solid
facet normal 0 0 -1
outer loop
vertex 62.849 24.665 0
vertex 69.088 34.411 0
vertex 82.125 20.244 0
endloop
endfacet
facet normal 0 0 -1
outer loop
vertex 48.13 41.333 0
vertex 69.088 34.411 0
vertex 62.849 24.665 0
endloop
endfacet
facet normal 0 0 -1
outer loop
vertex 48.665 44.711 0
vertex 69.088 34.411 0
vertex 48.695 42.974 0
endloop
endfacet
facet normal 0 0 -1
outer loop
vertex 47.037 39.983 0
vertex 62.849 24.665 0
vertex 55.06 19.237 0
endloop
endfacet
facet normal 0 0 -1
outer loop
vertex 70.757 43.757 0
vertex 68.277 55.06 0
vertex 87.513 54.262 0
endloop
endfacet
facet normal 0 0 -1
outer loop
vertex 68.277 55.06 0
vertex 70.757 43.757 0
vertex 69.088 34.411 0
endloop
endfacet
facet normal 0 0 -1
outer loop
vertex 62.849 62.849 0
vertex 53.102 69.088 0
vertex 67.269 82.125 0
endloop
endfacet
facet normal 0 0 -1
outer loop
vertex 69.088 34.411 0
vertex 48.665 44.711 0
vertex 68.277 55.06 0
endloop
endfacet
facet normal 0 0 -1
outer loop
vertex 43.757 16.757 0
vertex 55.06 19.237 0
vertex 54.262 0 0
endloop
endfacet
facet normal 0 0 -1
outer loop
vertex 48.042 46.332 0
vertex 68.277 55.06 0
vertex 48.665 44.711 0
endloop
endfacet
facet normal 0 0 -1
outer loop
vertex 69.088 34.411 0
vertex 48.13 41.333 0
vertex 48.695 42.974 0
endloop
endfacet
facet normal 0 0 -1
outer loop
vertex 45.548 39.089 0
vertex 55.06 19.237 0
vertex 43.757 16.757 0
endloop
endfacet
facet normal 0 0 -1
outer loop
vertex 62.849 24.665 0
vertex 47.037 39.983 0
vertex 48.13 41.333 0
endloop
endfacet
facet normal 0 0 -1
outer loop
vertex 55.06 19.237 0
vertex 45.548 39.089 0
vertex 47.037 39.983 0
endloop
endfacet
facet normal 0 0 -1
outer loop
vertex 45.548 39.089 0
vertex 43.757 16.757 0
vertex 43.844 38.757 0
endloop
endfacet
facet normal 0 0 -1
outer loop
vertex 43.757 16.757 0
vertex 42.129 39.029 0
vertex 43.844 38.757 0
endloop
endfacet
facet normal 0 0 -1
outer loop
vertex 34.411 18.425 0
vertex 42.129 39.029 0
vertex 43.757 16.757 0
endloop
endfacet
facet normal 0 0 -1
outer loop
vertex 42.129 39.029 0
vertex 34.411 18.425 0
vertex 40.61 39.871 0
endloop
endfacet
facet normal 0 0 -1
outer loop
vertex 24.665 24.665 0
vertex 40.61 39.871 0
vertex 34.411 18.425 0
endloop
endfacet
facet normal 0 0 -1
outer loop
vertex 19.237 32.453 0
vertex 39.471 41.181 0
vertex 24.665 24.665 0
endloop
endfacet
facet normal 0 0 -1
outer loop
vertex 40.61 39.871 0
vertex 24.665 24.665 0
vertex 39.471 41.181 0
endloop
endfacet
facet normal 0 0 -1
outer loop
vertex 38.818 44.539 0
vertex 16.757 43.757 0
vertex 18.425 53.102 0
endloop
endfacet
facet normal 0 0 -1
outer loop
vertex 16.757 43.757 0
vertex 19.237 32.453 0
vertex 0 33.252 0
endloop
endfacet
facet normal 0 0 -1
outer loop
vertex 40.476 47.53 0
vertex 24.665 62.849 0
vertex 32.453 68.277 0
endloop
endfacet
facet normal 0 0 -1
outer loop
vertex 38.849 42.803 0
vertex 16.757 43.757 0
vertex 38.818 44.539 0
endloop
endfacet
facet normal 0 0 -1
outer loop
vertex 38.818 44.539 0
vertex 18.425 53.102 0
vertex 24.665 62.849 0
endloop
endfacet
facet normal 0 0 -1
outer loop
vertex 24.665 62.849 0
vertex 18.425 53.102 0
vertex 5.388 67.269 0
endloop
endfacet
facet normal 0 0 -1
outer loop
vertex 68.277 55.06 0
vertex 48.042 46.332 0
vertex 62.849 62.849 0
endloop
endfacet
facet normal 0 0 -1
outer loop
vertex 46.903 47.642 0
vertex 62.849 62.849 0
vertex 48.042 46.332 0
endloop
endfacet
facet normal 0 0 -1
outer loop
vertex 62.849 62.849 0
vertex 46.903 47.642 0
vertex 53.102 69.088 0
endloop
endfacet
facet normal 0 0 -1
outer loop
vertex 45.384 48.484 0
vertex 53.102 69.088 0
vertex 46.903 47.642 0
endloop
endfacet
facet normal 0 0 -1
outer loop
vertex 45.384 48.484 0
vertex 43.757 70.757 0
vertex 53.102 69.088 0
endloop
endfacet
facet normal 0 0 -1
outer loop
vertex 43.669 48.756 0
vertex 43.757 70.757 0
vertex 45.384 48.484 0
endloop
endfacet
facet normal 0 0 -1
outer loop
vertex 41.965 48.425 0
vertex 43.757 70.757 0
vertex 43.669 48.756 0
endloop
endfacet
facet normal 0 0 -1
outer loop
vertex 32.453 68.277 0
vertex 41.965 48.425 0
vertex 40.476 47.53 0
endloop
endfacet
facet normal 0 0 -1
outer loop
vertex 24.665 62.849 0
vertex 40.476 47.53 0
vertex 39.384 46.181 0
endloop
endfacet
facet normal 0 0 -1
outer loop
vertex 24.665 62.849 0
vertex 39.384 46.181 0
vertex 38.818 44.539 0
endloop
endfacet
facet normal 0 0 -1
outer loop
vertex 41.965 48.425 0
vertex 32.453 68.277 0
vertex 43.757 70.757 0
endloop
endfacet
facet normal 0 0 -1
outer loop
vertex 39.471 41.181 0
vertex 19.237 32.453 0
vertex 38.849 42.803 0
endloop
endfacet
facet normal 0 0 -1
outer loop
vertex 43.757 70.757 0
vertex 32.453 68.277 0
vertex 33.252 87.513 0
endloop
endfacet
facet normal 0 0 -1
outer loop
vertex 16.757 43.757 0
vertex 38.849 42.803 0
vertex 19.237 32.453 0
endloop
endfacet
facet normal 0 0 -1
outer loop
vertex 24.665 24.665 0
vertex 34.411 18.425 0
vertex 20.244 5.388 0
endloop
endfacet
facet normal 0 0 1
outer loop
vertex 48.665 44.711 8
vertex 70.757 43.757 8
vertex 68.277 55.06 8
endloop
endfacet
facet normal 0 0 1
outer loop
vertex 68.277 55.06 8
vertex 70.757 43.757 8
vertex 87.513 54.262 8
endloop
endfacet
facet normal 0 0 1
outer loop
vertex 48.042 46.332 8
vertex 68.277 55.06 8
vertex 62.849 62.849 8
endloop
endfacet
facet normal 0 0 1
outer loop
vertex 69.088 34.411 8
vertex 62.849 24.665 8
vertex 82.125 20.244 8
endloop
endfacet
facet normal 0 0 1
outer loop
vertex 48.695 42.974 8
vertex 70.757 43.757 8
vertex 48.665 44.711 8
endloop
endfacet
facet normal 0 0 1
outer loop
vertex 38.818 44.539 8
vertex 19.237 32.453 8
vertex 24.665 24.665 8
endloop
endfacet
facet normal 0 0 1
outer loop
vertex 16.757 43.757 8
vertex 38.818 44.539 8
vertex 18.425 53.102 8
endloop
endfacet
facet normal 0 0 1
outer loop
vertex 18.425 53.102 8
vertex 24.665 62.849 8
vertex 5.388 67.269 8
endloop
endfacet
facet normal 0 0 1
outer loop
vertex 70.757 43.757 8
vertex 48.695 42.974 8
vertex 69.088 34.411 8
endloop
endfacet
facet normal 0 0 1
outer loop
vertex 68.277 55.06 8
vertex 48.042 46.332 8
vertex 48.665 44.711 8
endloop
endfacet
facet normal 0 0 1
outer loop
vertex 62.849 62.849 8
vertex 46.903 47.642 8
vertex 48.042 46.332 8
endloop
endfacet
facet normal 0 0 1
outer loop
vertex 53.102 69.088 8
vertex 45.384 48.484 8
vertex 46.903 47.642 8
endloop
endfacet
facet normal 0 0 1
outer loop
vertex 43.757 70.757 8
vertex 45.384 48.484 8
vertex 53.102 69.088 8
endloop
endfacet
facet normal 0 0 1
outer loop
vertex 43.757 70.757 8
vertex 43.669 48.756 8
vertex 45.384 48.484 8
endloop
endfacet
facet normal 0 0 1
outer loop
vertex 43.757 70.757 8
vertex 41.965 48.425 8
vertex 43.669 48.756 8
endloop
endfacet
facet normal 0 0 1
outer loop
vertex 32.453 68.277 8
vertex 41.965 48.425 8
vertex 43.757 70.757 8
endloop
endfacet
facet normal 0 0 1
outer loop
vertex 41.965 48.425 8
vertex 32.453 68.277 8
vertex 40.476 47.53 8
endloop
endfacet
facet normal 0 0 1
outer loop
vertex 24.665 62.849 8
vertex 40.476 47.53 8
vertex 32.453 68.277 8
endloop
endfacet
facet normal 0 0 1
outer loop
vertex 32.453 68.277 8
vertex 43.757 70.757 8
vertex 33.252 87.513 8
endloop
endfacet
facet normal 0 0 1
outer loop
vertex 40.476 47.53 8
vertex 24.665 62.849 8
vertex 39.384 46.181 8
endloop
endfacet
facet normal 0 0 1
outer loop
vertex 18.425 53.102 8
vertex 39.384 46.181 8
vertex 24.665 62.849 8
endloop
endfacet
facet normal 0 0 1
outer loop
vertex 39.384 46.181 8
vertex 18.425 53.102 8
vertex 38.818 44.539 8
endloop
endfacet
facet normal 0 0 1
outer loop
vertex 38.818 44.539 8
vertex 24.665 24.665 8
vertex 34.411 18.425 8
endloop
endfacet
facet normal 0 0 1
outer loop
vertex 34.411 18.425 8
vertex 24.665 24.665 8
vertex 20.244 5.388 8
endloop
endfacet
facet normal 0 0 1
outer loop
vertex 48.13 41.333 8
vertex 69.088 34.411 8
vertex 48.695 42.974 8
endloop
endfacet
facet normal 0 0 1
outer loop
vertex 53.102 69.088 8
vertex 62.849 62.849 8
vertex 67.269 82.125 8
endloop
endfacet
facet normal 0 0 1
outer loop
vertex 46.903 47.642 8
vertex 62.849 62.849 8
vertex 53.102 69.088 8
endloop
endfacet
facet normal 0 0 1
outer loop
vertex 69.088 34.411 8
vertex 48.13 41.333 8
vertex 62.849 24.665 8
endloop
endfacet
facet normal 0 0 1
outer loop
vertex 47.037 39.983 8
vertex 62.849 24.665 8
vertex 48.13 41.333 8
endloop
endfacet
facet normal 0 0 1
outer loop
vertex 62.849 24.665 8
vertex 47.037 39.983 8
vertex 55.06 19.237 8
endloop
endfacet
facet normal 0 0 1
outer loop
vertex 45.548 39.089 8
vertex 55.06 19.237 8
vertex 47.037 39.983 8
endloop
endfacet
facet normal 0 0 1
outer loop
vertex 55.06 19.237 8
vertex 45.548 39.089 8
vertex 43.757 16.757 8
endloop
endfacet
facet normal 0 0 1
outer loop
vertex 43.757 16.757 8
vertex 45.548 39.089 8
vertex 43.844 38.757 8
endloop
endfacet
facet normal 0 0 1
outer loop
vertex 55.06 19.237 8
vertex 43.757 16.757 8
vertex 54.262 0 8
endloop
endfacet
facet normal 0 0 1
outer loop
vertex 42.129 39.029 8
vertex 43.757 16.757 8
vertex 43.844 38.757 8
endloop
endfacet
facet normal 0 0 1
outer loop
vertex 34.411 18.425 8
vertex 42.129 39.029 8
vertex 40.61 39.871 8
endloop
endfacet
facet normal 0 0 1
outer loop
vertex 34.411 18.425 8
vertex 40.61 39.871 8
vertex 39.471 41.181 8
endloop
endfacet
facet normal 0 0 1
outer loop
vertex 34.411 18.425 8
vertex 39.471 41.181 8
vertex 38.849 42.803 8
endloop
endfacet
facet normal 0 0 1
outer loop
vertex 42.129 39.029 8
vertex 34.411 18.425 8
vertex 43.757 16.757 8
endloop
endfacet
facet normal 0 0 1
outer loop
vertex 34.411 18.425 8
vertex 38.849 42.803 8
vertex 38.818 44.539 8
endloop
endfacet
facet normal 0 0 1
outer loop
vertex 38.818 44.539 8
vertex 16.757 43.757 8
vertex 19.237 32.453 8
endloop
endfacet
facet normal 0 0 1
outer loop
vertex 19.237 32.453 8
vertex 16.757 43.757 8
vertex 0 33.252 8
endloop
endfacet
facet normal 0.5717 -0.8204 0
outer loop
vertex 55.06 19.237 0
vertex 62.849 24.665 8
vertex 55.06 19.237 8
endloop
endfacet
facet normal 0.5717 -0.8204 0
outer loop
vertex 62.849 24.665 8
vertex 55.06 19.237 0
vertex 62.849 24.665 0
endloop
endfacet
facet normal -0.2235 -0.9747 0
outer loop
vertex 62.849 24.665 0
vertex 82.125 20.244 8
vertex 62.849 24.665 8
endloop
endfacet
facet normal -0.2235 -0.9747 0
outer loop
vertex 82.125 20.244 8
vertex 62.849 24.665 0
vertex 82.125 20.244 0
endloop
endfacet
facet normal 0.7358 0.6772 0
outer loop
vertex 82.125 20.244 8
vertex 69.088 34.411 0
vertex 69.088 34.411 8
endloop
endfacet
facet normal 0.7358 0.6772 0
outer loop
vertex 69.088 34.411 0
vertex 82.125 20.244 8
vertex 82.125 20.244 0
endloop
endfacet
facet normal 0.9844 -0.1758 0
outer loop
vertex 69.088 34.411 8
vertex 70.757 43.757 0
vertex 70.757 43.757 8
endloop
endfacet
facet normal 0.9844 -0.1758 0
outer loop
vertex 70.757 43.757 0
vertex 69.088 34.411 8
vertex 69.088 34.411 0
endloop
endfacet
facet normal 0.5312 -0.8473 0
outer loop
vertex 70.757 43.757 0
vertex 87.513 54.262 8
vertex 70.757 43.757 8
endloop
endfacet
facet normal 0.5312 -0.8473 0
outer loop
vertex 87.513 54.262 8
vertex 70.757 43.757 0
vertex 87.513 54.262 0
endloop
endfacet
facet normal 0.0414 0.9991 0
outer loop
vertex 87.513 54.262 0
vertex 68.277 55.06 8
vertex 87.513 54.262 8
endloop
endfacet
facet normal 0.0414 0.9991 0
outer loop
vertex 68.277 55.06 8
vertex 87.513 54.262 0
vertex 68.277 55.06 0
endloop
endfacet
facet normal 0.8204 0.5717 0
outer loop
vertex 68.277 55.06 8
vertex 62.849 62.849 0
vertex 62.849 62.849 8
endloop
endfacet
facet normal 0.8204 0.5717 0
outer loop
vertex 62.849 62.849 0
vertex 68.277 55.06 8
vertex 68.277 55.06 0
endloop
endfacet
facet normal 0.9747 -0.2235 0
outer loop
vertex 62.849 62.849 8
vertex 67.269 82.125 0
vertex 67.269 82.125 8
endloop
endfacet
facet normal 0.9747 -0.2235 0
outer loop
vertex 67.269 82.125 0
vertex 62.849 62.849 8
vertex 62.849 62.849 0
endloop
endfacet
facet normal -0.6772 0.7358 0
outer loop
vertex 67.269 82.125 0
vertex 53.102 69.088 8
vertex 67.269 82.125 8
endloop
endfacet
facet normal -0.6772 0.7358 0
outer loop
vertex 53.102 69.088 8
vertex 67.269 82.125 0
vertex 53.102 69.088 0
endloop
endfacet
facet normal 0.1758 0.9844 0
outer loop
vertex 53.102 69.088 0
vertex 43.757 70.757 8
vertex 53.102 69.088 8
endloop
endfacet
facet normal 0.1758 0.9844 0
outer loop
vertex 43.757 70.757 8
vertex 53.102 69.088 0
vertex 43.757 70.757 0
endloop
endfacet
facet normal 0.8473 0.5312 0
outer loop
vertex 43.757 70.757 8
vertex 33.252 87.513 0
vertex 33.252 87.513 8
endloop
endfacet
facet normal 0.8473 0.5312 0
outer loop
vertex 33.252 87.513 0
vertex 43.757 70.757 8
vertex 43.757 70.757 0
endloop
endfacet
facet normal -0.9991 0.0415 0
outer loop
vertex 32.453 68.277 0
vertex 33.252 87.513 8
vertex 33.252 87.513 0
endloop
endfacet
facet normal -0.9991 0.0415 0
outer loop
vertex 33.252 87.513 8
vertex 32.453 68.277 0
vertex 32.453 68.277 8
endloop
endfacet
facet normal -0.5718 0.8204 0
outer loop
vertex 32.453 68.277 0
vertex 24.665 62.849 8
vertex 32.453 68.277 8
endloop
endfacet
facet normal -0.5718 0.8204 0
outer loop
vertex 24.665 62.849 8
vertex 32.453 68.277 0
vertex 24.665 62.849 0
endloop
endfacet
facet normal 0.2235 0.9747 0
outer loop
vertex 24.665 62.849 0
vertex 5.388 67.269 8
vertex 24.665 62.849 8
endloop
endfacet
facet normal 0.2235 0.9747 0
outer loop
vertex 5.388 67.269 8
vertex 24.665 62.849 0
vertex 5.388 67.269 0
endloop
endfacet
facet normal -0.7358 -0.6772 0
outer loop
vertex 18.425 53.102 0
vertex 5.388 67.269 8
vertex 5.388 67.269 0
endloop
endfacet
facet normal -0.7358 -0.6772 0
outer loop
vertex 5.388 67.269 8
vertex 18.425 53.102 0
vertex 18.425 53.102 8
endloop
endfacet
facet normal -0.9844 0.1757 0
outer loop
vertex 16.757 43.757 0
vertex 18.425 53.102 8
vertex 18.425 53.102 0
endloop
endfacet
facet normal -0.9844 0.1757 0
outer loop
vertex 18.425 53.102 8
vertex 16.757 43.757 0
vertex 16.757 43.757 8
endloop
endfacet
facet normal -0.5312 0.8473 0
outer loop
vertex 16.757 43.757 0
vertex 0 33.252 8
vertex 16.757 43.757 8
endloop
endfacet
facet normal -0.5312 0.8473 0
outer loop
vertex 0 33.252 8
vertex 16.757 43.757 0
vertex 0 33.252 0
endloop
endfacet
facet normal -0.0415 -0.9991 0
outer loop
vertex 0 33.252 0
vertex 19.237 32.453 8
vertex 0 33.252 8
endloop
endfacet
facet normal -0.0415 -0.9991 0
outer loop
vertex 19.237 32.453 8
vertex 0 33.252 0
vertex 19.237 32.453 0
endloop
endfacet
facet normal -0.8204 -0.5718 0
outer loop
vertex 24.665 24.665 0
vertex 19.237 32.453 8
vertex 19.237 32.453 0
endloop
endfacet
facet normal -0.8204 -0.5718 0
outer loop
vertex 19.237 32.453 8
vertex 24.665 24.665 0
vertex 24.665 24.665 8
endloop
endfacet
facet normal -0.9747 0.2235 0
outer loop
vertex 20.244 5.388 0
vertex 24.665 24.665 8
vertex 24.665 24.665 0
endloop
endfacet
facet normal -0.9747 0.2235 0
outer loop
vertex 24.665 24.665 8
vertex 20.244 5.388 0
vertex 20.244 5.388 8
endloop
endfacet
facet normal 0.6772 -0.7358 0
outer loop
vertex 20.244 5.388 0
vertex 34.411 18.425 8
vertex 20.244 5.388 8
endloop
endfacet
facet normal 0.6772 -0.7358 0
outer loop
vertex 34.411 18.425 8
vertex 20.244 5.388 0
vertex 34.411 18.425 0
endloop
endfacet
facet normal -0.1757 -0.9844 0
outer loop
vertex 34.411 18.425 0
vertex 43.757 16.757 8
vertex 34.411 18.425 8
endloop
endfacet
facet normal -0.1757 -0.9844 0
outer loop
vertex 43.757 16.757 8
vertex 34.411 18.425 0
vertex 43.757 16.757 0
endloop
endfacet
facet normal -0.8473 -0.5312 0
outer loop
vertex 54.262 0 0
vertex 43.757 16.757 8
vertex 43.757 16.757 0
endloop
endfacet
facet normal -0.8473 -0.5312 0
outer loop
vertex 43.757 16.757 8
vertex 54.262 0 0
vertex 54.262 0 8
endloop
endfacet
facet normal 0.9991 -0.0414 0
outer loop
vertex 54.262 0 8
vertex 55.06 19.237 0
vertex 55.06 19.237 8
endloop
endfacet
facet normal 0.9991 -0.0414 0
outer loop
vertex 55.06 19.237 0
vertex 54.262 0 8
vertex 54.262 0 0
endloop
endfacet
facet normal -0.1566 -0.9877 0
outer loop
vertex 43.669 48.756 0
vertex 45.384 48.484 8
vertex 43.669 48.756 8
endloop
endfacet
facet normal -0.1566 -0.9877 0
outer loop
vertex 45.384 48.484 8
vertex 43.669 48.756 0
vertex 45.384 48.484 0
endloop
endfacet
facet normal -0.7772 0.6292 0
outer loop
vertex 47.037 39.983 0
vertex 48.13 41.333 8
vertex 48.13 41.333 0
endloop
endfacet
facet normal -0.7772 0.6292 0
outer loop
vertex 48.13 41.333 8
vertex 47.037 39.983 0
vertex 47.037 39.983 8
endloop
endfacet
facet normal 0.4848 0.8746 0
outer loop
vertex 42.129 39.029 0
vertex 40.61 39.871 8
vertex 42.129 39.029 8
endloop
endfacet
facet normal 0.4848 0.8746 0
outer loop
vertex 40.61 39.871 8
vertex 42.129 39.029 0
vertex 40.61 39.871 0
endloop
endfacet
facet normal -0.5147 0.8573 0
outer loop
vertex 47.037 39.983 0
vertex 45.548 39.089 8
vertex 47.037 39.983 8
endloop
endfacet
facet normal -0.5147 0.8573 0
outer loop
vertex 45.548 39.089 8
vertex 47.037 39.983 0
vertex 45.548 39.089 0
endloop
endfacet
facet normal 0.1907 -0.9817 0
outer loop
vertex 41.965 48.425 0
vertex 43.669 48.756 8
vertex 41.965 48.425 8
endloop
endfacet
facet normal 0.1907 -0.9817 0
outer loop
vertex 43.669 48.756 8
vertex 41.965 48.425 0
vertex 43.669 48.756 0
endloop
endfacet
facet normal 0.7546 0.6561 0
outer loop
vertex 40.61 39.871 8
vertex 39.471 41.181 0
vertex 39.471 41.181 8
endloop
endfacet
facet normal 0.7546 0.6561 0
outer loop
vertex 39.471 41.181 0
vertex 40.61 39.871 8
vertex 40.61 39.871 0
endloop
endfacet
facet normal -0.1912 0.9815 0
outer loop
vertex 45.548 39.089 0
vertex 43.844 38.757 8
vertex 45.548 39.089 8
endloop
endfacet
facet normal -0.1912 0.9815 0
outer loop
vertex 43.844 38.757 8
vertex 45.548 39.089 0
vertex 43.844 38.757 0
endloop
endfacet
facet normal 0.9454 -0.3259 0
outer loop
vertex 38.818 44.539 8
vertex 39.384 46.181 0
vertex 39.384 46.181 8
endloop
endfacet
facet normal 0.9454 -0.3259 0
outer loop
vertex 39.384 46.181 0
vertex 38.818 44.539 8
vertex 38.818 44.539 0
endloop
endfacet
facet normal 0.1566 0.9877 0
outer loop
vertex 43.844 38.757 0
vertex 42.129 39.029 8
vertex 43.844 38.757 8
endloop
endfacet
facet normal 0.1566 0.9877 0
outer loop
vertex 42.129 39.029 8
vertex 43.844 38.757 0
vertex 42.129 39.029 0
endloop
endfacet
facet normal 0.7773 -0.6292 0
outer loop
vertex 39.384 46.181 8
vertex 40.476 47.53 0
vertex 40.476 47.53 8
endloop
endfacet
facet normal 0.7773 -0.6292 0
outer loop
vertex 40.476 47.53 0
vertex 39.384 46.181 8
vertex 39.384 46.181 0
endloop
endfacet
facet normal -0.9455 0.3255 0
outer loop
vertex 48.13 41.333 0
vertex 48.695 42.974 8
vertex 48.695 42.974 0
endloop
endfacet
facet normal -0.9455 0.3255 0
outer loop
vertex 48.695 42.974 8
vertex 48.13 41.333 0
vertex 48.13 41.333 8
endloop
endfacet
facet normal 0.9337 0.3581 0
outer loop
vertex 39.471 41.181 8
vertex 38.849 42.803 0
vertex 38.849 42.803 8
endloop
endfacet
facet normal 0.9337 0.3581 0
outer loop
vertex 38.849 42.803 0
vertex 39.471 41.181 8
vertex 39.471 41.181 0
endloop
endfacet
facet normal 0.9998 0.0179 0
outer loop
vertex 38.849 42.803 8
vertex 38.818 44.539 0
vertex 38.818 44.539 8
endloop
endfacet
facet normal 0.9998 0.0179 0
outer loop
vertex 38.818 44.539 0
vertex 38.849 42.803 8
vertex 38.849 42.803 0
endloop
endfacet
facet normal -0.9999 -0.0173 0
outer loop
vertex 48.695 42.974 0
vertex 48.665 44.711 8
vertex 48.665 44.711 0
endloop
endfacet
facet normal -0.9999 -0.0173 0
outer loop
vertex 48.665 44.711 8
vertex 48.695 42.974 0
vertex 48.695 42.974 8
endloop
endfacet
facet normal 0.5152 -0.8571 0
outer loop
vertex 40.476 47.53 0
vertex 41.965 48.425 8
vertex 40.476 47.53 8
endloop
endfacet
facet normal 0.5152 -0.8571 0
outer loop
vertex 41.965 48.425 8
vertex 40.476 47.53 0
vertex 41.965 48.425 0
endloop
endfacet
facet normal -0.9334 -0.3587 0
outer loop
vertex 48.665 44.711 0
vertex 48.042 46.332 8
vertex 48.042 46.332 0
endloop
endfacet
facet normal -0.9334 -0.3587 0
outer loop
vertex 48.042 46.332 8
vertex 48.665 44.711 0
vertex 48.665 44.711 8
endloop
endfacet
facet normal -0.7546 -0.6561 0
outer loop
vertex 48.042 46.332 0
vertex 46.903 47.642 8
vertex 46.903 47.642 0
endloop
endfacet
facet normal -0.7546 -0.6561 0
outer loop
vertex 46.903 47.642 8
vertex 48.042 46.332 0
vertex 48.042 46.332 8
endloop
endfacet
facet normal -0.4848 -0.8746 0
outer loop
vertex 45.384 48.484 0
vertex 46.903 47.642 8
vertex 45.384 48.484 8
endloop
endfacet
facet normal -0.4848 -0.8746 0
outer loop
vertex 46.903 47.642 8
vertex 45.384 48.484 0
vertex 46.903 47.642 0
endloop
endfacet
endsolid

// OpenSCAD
$fn = 32;

// ----------------------------------------------------------------------
// Star wheel: 8-point ratchet, R45
// ----------------------------------------------------------------------

// --- parameters (mm) ---
n_points = 8;             // number of points / teeth
r_out = 45;               // tip radius
r_in = 27;                // root radius
bore_r = 5;               // centre bore radius
plate_t = 8;              // plate thickness, Z (extrusion height)
bore_d = 10;              // centre bore diameter
fit_tol = 0.05;           // declared fit tolerance (prompt contract)
free_tol = 0.3;           // declared free tolerance (prompt contract)

profile = [[16.757, 43.757], [0, 33.252], [19.237, 32.453], [24.665, 24.665], [20.244, 5.388], [34.411, 18.425], [43.757, 16.757], [54.262, 0], [55.06, 19.237], [62.849, 24.665], [82.125, 20.244], [69.088, 34.411], [70.757, 43.757], [87.513, 54.262], [68.277, 55.06], [62.849, 62.849], [67.269, 82.125], [53.102, 69.088], [43.757, 70.757], [33.252, 87.513], [32.453, 68.277], [24.665, 62.849], [5.388, 67.269], [18.425, 53.102]];  // primary outline, 24 points, counter clockwise
void_1 = [[48.665, 44.711], [48.042, 46.332], [46.903, 47.642], [45.384, 48.484], [43.669, 48.756], [41.965, 48.425], [40.476, 47.53], [39.384, 46.181], [38.818, 44.539], [38.849, 42.803], [39.471, 41.181], [40.61, 39.871], [42.129, 39.029], [43.844, 38.757], [45.548, 39.089], [47.037, 39.983], [48.13, 41.333], [48.695, 42.974]];  // centre bore, 18 points

// --- the one profile operation ---
difference() {
  linear_extrude(height = plate_t) polygon(points = profile);
  translate([0, 0, -1])
    linear_extrude(height = plate_t + 2) polygon(points = void_1);
}
